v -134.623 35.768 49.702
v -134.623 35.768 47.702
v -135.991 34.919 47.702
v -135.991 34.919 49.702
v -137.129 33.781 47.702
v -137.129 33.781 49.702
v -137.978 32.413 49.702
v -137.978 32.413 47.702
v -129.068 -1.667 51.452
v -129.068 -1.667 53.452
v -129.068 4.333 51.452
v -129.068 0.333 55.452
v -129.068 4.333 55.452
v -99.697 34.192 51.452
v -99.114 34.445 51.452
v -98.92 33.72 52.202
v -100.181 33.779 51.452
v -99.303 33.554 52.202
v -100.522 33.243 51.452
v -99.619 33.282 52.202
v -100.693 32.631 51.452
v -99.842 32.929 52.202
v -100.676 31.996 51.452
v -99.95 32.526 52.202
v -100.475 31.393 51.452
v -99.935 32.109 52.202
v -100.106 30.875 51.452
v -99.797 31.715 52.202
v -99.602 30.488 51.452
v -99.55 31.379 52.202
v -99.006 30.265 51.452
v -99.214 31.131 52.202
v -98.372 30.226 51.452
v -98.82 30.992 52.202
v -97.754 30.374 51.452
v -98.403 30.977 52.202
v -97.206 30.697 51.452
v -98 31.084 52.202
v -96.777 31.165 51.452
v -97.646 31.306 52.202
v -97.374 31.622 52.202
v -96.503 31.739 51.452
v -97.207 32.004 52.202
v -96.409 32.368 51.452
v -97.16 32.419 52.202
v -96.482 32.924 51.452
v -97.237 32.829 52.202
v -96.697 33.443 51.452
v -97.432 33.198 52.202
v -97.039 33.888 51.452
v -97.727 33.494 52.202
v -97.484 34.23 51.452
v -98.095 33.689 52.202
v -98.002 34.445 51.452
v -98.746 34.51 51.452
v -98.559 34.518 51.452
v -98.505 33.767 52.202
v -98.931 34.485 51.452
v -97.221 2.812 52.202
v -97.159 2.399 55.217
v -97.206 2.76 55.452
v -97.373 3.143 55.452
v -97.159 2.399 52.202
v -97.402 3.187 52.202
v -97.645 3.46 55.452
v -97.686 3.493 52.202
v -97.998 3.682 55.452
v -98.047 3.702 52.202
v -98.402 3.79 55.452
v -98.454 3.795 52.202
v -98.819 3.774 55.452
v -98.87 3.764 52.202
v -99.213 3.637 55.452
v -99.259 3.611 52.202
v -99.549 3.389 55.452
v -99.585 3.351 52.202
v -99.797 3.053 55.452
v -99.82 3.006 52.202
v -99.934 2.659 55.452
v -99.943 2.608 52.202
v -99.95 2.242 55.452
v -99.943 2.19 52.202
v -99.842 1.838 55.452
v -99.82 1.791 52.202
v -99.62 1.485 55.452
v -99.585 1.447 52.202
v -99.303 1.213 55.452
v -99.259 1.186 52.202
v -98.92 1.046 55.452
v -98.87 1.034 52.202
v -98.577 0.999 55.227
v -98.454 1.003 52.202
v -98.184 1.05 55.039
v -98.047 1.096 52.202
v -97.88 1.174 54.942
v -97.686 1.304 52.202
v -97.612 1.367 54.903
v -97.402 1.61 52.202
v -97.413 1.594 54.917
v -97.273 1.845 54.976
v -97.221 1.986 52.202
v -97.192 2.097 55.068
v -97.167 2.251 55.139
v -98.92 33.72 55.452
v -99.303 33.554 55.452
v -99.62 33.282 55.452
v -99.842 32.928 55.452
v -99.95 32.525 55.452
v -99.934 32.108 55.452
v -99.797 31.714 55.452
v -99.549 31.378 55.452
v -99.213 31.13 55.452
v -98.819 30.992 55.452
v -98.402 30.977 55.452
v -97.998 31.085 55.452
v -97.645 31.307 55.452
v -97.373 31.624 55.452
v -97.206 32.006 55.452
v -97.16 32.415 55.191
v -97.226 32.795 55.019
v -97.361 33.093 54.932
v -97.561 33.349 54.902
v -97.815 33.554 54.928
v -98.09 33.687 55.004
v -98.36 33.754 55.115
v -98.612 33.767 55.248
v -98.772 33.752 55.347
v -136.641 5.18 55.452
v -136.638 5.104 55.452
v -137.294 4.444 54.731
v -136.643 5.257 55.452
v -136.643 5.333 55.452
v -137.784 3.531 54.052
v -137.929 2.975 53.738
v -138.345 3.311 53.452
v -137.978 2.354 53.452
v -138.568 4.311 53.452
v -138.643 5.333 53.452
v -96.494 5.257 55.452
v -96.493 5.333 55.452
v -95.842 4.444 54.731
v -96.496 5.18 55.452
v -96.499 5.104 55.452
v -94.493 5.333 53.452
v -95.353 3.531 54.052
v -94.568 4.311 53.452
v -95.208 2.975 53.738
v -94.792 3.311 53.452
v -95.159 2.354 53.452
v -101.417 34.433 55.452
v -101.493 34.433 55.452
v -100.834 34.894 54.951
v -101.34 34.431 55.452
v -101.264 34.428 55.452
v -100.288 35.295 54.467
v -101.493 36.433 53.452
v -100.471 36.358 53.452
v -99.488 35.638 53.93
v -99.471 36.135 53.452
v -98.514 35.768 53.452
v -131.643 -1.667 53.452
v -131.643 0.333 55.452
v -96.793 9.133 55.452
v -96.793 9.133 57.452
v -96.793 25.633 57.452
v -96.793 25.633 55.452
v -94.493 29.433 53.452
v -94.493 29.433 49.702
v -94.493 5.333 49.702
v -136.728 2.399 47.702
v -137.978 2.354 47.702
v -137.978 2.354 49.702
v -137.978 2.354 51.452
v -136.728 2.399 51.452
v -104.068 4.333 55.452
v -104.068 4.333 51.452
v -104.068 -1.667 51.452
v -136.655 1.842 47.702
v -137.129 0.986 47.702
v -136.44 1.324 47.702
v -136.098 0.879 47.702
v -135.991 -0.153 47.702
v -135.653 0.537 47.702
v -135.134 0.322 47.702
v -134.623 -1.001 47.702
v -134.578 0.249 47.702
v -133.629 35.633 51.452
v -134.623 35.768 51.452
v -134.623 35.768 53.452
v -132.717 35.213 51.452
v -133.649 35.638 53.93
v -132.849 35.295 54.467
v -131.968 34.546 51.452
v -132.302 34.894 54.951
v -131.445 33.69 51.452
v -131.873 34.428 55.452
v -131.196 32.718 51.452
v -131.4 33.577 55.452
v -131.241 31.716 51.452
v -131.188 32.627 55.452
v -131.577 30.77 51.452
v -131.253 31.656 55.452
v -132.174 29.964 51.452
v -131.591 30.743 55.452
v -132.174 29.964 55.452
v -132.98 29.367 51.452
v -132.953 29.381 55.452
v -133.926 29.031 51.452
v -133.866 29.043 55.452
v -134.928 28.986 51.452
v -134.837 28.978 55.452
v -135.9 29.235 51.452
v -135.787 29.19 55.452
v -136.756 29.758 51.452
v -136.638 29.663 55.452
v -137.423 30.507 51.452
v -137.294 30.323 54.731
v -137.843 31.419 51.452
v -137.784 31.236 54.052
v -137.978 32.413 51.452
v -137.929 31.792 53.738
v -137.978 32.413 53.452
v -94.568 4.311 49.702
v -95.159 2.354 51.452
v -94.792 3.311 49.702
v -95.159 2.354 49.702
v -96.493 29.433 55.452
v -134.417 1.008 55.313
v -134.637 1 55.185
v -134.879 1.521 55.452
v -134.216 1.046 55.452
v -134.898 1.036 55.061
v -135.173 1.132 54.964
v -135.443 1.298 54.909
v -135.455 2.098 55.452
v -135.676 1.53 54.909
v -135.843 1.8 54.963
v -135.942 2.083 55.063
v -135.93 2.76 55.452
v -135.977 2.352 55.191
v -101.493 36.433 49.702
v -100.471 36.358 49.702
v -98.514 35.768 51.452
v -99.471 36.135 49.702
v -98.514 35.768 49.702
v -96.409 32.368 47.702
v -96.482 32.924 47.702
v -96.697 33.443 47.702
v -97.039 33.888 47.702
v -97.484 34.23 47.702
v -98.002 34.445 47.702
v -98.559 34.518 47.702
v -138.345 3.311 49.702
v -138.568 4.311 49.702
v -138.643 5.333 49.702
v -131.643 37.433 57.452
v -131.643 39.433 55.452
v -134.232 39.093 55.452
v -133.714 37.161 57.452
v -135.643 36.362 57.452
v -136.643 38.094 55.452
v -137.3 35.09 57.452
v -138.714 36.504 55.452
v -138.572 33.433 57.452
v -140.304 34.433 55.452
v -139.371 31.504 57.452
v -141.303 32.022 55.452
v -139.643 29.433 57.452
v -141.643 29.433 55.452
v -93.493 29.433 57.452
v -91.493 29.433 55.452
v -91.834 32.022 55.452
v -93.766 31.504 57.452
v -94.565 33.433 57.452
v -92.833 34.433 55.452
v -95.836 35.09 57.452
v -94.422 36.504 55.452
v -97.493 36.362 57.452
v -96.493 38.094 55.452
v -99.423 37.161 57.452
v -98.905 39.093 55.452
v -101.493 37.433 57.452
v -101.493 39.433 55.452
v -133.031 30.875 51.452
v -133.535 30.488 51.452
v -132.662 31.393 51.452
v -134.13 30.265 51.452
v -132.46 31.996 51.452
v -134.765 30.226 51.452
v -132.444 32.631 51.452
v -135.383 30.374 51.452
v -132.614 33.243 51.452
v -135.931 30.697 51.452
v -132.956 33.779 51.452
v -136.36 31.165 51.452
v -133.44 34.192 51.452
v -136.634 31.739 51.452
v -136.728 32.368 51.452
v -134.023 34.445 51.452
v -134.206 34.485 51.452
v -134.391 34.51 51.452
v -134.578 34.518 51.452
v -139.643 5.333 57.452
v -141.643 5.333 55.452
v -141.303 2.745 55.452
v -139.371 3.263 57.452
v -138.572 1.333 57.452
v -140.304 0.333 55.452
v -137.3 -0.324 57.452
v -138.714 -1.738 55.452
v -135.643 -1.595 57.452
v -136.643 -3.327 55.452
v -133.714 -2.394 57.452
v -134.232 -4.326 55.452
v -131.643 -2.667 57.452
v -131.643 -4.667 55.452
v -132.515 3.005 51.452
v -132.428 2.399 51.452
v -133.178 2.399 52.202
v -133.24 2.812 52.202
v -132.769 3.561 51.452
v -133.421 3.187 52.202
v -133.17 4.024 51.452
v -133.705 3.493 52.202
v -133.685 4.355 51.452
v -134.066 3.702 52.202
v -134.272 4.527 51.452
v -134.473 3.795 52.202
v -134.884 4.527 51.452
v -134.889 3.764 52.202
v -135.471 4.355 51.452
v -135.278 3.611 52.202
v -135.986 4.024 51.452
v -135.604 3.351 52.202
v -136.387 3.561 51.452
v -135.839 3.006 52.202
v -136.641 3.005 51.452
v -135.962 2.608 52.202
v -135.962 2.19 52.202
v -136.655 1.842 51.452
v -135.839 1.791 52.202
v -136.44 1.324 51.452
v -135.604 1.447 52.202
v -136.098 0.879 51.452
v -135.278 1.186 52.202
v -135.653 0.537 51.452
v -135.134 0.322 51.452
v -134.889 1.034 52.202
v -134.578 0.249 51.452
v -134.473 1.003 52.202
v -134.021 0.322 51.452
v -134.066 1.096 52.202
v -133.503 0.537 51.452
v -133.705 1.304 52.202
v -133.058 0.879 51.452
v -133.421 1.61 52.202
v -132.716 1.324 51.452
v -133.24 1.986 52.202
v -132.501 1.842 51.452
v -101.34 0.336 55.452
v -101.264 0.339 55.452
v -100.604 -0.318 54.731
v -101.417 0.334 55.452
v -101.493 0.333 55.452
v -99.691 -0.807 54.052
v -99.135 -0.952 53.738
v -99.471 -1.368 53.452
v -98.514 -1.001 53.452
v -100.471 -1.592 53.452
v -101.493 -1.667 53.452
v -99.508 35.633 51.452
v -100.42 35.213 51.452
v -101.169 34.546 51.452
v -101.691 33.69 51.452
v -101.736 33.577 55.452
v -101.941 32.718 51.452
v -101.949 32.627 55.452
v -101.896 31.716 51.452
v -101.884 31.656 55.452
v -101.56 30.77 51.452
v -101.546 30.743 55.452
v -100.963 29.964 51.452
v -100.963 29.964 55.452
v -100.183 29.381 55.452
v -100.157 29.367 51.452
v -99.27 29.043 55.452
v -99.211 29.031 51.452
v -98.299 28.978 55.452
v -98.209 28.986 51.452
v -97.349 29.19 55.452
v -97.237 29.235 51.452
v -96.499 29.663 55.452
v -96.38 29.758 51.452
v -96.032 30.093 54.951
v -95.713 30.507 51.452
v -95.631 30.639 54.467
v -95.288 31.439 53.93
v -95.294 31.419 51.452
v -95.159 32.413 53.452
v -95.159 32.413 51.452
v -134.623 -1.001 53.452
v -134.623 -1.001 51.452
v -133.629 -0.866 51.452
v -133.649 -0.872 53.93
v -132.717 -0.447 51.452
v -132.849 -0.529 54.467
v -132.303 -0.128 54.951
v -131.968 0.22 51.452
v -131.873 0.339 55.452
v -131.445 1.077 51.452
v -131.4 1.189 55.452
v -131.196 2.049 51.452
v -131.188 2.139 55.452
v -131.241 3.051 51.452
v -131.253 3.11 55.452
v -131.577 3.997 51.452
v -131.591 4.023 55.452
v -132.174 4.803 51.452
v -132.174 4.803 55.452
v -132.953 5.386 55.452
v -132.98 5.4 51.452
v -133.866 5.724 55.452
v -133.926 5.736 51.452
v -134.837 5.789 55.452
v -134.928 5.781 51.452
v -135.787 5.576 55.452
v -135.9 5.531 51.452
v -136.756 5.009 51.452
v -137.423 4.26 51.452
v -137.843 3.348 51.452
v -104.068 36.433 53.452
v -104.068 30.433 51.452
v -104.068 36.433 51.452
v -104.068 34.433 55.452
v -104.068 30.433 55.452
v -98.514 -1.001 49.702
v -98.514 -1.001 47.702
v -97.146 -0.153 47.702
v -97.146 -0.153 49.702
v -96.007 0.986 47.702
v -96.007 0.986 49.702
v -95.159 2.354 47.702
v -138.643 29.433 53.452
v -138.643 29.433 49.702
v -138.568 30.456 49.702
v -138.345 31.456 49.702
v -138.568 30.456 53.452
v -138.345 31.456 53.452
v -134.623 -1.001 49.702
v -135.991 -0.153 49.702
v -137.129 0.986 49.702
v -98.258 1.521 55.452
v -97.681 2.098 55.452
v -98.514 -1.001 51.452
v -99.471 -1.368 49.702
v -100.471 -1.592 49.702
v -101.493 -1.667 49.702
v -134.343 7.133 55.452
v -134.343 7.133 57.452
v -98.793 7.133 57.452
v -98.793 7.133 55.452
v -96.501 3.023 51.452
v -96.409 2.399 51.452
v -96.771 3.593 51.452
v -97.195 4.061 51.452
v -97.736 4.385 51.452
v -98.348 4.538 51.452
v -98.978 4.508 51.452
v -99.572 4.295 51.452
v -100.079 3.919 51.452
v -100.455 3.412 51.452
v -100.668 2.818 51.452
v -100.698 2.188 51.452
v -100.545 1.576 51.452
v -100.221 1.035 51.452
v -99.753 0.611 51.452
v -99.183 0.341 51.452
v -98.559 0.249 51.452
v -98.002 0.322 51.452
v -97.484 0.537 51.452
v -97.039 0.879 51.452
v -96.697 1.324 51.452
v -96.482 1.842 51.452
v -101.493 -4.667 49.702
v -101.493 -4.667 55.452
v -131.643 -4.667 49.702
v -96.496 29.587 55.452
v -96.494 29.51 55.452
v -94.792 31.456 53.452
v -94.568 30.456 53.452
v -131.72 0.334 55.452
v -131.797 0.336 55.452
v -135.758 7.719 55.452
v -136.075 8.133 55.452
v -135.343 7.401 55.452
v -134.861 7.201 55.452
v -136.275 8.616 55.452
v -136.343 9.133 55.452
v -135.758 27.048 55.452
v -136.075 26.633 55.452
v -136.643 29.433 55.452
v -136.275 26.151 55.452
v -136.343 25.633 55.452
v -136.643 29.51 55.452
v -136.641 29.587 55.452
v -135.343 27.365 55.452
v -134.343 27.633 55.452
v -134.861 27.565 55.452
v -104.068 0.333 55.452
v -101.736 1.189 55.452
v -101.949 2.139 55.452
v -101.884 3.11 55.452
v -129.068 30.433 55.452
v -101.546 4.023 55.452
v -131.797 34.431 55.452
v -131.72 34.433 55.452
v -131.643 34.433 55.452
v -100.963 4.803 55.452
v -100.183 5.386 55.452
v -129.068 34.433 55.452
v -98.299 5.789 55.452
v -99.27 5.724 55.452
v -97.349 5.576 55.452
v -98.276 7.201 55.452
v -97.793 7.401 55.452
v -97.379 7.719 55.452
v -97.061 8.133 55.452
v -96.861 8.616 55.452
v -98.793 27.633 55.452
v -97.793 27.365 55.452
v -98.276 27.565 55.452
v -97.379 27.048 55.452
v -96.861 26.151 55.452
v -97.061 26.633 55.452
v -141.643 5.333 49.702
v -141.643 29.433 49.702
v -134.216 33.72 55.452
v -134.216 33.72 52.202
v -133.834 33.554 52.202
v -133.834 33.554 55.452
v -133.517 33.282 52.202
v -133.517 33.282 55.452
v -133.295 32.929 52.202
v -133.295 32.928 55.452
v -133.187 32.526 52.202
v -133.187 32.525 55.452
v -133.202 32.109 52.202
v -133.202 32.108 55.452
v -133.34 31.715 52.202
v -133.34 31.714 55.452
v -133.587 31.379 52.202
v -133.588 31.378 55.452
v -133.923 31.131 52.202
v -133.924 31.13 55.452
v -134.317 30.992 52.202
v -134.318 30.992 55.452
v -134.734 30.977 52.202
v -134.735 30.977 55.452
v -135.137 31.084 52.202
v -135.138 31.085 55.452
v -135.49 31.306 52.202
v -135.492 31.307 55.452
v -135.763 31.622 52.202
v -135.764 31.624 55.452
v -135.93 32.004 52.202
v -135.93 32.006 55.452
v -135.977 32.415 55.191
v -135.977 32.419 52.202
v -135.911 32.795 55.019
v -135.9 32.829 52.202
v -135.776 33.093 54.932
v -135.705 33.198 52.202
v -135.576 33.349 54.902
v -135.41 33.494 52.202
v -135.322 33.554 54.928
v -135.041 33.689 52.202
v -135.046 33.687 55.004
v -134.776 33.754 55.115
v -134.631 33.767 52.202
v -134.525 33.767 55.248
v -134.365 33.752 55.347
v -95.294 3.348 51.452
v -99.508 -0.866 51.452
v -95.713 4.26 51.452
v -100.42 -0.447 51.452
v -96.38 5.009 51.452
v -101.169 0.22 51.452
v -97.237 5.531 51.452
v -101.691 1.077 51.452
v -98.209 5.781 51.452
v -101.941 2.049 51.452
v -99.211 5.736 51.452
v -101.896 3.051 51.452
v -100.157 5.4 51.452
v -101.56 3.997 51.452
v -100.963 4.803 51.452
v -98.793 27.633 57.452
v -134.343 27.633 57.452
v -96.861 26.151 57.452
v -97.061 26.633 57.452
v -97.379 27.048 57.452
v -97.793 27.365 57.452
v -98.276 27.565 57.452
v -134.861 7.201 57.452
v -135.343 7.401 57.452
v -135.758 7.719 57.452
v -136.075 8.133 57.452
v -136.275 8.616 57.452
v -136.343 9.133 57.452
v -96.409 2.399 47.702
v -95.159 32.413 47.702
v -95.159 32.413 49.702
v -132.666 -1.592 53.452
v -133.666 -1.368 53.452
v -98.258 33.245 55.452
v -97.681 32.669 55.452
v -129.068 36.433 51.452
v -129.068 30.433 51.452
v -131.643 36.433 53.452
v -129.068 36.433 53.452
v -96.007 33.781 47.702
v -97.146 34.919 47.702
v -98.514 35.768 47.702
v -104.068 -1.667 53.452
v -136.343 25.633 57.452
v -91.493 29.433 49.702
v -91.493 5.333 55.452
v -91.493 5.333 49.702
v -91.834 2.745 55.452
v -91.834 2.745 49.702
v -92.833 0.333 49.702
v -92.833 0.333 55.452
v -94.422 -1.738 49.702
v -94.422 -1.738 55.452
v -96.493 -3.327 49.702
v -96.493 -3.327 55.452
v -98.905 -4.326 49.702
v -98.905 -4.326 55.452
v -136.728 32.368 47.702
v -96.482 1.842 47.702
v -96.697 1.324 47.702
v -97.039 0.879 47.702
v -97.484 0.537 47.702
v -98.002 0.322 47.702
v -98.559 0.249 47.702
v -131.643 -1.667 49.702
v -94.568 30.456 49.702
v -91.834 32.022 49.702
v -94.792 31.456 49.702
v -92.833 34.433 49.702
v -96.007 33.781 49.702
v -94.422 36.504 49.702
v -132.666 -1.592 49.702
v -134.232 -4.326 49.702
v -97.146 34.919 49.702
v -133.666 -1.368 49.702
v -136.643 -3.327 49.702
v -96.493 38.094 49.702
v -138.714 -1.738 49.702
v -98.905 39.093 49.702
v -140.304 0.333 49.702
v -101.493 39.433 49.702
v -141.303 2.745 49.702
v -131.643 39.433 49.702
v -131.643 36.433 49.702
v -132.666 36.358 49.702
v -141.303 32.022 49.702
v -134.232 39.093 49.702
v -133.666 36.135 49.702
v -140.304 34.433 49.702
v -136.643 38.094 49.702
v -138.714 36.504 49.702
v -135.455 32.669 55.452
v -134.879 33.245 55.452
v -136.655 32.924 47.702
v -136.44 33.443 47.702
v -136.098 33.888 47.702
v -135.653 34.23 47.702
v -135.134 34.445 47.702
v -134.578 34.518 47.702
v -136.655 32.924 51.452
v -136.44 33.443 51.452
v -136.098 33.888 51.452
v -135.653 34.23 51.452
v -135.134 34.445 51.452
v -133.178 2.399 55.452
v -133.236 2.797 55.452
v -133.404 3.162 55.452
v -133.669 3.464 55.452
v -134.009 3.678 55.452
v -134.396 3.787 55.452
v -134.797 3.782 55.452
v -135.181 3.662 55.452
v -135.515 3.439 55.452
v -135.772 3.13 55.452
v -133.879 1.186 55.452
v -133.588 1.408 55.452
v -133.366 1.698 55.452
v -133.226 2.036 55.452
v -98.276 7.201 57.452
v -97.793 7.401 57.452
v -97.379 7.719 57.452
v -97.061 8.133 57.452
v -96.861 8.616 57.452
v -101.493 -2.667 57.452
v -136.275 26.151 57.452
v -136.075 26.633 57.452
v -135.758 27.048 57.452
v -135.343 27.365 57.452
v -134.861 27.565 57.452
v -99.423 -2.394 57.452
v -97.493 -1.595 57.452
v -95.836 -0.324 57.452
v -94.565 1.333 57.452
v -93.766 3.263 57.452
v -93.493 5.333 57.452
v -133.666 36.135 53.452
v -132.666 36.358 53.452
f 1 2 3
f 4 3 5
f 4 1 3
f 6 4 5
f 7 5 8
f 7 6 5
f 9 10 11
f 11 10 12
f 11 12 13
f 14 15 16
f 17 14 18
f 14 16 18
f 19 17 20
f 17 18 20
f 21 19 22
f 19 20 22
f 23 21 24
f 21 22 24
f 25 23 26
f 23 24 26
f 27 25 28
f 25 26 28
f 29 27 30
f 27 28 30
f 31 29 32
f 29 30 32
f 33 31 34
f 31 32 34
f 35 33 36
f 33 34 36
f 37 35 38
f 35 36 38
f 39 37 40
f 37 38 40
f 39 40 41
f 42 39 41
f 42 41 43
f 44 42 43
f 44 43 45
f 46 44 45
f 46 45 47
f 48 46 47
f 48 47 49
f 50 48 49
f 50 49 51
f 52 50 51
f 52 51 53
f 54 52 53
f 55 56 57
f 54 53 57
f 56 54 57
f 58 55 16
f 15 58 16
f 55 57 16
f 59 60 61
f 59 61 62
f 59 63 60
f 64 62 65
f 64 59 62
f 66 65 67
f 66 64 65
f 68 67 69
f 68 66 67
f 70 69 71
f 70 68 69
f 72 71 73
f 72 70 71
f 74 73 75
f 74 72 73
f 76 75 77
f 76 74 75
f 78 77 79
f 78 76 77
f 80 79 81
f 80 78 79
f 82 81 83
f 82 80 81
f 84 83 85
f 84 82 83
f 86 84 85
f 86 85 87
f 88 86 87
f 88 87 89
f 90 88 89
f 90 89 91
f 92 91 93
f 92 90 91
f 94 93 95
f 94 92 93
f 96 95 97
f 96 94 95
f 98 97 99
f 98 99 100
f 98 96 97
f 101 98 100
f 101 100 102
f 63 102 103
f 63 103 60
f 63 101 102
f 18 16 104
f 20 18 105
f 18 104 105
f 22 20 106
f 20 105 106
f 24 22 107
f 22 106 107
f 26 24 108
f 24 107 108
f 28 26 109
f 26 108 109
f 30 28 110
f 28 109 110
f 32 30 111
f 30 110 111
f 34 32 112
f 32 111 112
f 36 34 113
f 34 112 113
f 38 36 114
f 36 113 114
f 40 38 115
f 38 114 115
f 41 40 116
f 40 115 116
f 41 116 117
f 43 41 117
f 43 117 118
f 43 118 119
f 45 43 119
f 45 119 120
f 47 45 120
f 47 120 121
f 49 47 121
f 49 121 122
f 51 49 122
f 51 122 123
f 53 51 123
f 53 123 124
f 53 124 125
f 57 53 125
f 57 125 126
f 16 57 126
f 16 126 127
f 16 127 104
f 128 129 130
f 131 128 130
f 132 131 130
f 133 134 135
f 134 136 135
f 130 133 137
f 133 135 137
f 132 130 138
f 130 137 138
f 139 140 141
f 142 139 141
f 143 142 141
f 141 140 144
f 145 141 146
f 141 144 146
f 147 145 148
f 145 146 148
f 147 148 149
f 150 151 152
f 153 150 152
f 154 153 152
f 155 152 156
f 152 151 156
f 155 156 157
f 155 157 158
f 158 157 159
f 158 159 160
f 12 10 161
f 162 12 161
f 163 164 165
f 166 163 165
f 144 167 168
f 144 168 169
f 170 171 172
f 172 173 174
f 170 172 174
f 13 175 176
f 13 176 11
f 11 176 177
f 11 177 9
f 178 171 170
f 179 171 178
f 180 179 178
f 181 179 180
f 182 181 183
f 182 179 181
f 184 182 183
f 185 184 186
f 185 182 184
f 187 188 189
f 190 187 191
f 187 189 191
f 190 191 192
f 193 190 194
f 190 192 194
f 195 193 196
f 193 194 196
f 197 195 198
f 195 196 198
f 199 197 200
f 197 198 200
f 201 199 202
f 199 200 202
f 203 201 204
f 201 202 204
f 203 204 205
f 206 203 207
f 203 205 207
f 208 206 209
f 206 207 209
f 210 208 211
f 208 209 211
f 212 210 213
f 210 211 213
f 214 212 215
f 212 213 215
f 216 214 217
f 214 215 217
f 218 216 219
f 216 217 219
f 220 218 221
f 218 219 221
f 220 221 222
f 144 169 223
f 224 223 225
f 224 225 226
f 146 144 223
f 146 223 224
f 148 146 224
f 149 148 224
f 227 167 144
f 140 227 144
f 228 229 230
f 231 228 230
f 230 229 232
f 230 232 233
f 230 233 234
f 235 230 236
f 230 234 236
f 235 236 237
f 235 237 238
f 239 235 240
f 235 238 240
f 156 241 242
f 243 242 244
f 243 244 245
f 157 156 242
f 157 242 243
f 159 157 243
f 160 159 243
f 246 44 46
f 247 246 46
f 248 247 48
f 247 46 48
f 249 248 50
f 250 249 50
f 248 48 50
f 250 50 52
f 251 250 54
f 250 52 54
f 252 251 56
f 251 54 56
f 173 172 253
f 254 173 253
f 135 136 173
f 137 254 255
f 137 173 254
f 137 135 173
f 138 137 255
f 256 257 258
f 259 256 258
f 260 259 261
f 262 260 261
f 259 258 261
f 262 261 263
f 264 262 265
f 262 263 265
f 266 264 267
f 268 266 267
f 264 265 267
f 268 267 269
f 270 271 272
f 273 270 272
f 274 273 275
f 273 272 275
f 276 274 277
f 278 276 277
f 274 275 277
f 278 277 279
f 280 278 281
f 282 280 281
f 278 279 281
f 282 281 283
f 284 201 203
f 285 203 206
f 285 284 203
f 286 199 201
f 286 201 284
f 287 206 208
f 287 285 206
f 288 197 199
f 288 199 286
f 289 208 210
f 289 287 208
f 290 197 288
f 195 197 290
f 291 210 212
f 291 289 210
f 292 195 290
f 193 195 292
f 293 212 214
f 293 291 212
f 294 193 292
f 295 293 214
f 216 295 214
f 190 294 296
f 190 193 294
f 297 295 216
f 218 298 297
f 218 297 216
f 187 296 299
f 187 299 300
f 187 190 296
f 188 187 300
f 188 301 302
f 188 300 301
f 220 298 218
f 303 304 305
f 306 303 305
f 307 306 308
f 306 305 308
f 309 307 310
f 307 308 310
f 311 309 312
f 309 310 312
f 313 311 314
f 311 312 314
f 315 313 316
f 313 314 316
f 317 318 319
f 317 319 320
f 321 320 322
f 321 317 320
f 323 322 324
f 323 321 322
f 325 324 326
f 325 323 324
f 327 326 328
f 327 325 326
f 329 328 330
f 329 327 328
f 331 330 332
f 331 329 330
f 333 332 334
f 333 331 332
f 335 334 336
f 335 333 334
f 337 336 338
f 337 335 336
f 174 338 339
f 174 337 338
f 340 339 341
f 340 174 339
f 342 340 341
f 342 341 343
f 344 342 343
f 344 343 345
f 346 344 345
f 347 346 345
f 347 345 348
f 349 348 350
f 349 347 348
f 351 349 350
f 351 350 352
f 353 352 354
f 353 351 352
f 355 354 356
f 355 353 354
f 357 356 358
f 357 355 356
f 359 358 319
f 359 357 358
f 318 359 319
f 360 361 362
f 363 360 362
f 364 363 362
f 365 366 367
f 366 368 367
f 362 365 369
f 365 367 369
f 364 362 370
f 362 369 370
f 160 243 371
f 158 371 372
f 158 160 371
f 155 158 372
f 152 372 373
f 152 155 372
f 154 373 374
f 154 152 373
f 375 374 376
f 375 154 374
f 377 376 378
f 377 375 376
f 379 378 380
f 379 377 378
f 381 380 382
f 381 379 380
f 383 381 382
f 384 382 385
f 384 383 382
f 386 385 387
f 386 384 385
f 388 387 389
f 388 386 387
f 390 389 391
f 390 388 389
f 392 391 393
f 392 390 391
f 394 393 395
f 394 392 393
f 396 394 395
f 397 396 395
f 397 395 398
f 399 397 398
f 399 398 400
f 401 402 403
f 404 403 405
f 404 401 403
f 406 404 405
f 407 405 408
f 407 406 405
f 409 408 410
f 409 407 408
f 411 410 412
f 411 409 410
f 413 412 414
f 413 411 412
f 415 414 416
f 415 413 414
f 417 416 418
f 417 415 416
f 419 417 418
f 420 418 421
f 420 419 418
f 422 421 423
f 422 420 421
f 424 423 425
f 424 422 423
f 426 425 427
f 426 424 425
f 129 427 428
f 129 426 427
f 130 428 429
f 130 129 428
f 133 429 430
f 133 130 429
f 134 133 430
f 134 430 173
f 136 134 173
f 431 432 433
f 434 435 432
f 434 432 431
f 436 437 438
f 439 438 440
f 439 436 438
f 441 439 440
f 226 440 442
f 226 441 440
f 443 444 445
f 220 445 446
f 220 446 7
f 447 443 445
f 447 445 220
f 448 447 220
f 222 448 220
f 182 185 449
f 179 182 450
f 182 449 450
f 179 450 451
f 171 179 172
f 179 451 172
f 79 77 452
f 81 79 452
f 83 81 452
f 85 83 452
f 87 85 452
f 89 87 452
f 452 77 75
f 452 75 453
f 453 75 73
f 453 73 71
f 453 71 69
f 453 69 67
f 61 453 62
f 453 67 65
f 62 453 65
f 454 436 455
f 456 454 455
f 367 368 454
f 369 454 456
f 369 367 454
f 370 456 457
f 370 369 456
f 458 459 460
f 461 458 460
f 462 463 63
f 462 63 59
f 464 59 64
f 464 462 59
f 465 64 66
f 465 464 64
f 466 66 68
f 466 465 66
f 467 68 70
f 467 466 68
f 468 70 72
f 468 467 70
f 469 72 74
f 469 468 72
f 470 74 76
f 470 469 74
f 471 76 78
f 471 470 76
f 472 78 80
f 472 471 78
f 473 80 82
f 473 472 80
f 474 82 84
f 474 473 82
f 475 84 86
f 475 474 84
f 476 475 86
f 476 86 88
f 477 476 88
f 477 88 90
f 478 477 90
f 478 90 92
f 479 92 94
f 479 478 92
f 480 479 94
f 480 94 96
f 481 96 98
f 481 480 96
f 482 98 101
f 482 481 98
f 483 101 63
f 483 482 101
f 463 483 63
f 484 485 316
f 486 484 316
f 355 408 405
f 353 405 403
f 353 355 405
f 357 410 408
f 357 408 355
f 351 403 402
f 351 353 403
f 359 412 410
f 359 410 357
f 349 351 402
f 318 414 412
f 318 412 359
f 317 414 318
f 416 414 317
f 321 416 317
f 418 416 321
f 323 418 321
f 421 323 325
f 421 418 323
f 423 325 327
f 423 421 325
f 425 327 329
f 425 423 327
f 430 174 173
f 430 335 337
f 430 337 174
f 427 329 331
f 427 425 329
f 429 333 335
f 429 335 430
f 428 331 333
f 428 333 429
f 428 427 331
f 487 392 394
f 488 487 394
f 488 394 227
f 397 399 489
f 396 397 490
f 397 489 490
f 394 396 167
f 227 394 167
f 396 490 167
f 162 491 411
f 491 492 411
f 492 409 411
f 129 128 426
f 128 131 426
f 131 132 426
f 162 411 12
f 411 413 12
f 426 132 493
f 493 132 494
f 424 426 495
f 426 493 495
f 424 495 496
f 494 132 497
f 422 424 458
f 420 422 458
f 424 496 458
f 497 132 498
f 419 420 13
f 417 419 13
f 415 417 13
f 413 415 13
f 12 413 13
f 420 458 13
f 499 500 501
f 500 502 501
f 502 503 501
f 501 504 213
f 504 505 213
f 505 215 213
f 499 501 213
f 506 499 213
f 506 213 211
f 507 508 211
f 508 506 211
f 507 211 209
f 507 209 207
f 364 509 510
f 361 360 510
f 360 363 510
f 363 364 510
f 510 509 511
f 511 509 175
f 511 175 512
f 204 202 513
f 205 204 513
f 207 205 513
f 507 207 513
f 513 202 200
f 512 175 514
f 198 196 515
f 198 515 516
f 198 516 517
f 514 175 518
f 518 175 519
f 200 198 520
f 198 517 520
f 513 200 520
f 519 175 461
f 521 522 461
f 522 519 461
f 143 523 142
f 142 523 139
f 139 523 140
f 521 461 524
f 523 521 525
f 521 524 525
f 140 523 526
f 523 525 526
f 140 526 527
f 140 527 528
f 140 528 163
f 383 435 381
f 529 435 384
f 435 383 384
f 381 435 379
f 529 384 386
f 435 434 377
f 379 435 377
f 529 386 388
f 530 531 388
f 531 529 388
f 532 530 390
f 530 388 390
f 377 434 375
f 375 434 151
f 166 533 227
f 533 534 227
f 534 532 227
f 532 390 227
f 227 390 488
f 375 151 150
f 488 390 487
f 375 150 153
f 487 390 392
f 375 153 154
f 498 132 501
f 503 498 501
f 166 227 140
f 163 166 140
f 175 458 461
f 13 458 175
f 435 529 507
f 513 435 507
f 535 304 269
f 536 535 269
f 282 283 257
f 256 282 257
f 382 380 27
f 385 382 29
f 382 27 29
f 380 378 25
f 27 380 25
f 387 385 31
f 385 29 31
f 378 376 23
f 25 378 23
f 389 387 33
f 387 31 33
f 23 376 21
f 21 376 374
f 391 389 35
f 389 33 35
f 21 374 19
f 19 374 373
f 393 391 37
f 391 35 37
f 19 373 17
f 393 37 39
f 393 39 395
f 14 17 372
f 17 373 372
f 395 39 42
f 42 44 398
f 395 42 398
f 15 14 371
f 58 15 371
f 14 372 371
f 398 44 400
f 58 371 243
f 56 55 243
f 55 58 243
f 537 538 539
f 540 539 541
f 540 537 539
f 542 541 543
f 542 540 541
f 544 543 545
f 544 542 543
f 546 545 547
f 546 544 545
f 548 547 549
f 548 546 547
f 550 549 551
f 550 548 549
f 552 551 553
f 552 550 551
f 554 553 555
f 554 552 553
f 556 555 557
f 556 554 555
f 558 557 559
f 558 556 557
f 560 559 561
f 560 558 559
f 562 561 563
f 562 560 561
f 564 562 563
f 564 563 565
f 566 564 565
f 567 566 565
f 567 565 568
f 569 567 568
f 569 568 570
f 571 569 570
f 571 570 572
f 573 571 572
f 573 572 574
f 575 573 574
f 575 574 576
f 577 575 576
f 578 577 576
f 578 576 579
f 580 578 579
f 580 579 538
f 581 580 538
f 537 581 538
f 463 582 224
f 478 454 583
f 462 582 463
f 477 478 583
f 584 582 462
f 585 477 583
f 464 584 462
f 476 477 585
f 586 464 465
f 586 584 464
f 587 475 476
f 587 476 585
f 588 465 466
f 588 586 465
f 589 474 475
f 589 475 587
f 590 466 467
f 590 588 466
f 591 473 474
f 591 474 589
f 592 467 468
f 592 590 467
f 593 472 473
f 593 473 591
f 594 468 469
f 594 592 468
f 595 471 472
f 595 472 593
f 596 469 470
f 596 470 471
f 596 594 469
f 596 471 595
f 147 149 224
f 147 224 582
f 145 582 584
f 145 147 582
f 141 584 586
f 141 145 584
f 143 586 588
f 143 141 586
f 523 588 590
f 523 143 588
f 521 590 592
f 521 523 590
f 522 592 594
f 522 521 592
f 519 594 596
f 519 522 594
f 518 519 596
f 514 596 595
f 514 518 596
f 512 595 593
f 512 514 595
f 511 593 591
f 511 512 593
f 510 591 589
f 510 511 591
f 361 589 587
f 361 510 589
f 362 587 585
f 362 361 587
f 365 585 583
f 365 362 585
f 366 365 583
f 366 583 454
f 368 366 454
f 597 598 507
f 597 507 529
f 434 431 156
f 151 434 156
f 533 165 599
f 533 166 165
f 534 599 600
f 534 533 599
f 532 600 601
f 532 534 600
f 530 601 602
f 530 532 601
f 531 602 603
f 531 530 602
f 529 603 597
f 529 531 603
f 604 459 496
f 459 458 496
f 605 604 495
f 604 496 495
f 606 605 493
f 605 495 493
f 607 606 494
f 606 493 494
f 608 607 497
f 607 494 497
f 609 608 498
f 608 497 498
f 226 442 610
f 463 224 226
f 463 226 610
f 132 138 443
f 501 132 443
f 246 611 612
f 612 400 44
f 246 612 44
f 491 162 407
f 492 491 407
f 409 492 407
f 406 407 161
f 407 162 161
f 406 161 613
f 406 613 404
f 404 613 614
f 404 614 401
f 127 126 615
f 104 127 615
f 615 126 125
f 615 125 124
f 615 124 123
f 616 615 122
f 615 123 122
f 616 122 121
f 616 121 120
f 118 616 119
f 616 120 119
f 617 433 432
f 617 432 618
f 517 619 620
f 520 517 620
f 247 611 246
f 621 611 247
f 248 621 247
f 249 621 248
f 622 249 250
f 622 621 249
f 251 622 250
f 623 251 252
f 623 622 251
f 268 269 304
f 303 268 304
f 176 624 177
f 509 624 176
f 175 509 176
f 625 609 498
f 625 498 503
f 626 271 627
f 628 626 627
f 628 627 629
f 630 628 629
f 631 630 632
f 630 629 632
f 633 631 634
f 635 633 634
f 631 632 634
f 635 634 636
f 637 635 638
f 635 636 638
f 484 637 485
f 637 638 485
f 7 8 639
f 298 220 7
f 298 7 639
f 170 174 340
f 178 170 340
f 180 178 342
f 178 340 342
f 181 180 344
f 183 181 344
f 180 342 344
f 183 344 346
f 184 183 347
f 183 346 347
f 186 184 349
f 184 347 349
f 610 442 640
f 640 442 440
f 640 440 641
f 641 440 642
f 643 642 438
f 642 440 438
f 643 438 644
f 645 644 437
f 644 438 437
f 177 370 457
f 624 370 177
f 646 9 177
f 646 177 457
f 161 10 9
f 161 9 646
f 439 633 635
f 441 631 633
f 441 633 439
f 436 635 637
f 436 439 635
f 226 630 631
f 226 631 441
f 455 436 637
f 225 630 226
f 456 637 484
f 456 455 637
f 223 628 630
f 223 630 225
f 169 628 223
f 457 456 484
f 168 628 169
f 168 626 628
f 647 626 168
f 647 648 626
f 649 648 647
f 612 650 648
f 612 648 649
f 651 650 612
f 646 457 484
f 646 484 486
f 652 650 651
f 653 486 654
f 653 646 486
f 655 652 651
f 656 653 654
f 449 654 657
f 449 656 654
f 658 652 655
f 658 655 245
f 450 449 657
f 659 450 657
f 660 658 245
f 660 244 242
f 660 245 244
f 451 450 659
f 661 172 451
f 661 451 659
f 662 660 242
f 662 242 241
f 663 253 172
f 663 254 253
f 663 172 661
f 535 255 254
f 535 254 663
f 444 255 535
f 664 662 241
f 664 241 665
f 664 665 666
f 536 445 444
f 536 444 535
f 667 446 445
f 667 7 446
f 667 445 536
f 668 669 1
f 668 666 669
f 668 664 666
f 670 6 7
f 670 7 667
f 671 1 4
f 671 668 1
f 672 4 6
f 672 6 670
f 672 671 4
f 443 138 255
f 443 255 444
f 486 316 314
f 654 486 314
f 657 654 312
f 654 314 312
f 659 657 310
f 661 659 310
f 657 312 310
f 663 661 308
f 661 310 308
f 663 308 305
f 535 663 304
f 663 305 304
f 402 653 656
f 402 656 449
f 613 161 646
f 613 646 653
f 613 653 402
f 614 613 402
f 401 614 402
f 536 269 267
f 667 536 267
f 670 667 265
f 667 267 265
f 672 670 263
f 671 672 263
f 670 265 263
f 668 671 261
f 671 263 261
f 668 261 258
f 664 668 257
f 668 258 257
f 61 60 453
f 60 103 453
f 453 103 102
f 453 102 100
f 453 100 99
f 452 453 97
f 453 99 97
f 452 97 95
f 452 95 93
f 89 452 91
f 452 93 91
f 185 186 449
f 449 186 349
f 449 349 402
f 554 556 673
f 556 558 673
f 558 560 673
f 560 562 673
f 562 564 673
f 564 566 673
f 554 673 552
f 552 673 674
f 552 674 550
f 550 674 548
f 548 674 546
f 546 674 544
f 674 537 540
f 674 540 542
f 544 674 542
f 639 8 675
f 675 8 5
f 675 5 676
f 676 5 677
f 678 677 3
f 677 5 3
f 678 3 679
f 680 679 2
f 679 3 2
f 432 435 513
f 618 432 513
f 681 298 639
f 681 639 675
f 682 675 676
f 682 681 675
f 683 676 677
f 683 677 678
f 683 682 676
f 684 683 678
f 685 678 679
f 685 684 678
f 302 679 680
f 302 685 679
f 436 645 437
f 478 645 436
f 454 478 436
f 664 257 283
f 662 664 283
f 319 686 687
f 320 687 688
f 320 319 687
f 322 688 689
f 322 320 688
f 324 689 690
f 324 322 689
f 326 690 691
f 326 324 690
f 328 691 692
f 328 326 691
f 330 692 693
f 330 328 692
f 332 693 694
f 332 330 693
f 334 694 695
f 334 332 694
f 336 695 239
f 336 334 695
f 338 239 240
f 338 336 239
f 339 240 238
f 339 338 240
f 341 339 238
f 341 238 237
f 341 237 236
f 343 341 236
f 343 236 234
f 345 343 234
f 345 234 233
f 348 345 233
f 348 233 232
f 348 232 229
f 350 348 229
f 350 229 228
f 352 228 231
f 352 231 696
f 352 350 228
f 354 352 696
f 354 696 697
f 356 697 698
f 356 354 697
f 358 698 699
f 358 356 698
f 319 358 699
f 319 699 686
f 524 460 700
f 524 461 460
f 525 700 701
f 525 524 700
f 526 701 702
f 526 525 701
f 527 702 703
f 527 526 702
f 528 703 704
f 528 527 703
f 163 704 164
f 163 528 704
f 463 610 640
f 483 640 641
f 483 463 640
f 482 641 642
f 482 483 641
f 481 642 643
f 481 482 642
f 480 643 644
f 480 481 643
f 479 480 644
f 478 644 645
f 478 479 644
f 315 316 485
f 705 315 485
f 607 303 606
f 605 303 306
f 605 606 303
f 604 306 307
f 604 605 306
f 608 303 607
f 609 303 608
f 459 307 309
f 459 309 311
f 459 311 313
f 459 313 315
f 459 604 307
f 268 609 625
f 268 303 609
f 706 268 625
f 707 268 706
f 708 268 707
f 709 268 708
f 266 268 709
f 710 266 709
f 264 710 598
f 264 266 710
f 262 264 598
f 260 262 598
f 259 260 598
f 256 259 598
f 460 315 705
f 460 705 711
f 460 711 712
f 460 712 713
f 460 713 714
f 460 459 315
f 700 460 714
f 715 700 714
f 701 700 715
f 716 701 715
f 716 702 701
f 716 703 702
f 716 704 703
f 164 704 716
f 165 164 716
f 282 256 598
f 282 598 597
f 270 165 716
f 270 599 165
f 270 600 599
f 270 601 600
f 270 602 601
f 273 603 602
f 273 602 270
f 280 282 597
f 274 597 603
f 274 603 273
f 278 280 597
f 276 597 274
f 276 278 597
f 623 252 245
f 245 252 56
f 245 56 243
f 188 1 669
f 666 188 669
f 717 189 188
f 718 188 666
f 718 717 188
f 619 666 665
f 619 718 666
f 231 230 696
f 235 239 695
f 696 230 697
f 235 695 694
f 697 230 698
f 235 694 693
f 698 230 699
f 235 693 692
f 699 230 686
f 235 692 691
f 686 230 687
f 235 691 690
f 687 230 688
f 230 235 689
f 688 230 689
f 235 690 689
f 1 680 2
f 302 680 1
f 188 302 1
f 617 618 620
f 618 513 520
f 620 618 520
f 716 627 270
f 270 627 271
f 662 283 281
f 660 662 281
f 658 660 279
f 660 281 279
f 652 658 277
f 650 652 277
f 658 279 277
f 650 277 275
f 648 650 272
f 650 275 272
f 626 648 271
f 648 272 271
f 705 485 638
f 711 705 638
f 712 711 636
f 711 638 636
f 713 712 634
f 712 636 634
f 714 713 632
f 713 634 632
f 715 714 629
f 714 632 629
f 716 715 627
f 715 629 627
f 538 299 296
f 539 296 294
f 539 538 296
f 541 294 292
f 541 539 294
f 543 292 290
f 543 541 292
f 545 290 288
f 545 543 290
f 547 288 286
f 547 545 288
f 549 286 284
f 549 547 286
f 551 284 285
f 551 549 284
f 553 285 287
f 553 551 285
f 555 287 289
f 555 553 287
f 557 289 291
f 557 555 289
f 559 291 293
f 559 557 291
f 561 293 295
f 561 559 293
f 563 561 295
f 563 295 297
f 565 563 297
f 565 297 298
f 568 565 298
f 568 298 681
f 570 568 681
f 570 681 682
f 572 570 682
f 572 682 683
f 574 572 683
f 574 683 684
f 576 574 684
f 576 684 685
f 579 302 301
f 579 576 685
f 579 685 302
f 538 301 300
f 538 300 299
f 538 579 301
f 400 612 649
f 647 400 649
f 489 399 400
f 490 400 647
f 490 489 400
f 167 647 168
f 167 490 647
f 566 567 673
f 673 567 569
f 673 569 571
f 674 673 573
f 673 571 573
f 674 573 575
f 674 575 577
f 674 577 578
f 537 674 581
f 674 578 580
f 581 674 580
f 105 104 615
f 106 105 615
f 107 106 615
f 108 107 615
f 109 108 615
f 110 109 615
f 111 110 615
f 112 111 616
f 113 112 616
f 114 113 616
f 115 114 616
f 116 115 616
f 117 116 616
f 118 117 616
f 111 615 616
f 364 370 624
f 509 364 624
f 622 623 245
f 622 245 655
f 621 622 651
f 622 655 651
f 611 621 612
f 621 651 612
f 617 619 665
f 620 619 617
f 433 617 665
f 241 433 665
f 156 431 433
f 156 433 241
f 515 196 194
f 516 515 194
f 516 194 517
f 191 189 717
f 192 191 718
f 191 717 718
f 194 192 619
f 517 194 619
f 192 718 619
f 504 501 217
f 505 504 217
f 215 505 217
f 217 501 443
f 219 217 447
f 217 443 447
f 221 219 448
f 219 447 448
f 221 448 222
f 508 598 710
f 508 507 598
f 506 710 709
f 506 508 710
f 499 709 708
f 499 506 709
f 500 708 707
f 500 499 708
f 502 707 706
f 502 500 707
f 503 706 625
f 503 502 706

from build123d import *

# Parameters (mm, degrees)
SKETCH1_W                = 39.55
SKETCH1_H                = 20.5
BOSS_EXTRUDE1_DEPTH      = 2
BOSS_EXTRUDE2_DEPTH      = 5.75
SKETCH3_W                = 25
SKETCH3_H                = 6
BOSS_EXTRUDE3_DEPTH      = 4
FILLET1_R                = 2
CHAMFER1_SIZE            = 2
CHAMFER2_SIZE            = 2
SKETCH4_R                = 3.4
SKETCH4_R_2              = 1.4
BOSS_EXTRUDE4_DEPTH      = 4
CHAMFER3_SIZE            = 0.75
CHAMFER3_OF_MIRROR1_SIZE = 0.75
BOSS_EXTRUDE6_DEPTH      = 3.75
MIRROR4_COPY_1_DEPTH     = 3.75


# Read off the part's stored shape, not the designer's step: Mirror2
with BuildPart() as part:
    # Sketch1 → Boss-Extrude1 (new body)
    with BuildSketch(Plane.XY.offset(57.451538964)):
        with BuildLine():
            Line((-141.643342382, 29.433342856), (-141.643342382, 5.333342856))
            ThreePointArc((-141.643342382, 5.333342856), (-138.714410194, -1.737724956), (-131.643342382, -4.666657144))
            Line((-131.643342382, -4.666657144), (-101.493342382, -4.666657144))
            ThreePointArc((-101.493342382, -4.666657144), (-94.42227457, -1.737724956), (-91.493342382, 5.333342856))
            Line((-91.493342382, 5.333342856), (-91.493342382, 29.433342856))
            ThreePointArc((-91.493342382, 29.433342856), (-94.42227457, 36.504410668), (-101.493342382, 39.433342856))
            Line((-101.493342382, 39.433342856), (-131.643342382, 39.433342856))
            ThreePointArc((-131.643342382, 39.433342856), (-138.714410194, 36.504410668), (-141.643342382, 29.433342856))
        make_face()
        with Locations((-116.568342382, 17.383342856)):
            Rectangle(SKETCH1_W, SKETCH1_H, mode=Mode.SUBTRACT)
    extrude(amount=-BOSS_EXTRUDE1_DEPTH)

    # Sketch2 → Boss-Extrude2 (add)
    with BuildSketch(Plane(origin=(0, 0, 55.451538964), x_dir=(-1, 0, 0), z_dir=(0, 0, -1))):
        with BuildLine():
            Line((141.643342382, 5.333342856), (141.643342382, 29.433342856))
            ThreePointArc((141.643342382, 29.433342856), (138.714410194, 36.504410668), (131.643342382, 39.433342856))
            Line((131.643342382, 39.433342856), (101.493342382, 39.433342856))
            ThreePointArc((101.493342382, 39.433342856), (94.42227457, 36.504410668), (91.493342382, 29.433342856))
            Line((91.493342382, 29.433342856), (91.493342382, 5.333342856))
            ThreePointArc((91.493342382, 5.333342856), (94.42227457, -1.737724956), (101.493342382, -4.666657144))
            Line((101.493342382, -4.666657144), (131.643342382, -4.666657144))
            ThreePointArc((131.643342382, -4.666657144), (138.714410194, -1.737724956), (141.643342382, 5.333342856))
        make_face()
        with BuildLine():
            Line((138.643342382, 5.333342856), (138.643342382, 29.433342856))
            ThreePointArc((138.643342382, 29.433342856), (136.59308985, 34.383090325), (131.643342382, 36.433342856))
            Line((131.643342382, 36.433342856), (101.493342382, 36.433342856))
            ThreePointArc((101.493342382, 36.433342856), (96.543594913, 34.383090325), (94.493342382, 29.433342856))
            Line((94.493342382, 29.433342856), (94.493342382, 5.333342856))
            ThreePointArc((94.493342382, 5.333342856), (96.543594913, 0.383595388), (101.493342382, -1.666657144))
            Line((101.493342382, -1.666657144), (131.643342382, -1.666657144))
            ThreePointArc((131.643342382, -1.666657144), (136.59308985, 0.383595388), (138.643342382, 5.333342856))
        make_face(mode=Mode.SUBTRACT)
    extrude(amount=BOSS_EXTRUDE2_DEPTH)

    # Sketch3 → Boss-Extrude3 (add)
    with BuildSketch(Plane(origin=(0, 0, 55.451538964), x_dir=(-1, 0, 0), z_dir=(0, 0, -1))):
        with Locations((116.568342382, 33.433342856)):
            Rectangle(SKETCH3_W, SKETCH3_H)
        with Locations((116.568342382, 1.333342856)):
            Rectangle(SKETCH3_W, SKETCH3_H)
    extrude(amount=BOSS_EXTRUDE3_DEPTH)

    # Fillet1
    fillet1_edges = [part.edges().sort_by_distance(p)[0] for p in [
        (-136.343342382, 27.633342856, 56.451538964),
        (-136.343342382, 7.133342856, 56.451538964),
        (-96.793342382, 7.133342856, 56.451538964),
        (-96.793342382, 27.633342856, 56.451538964),
    ]]
    fillet(fillet1_edges, radius=FILLET1_R)

    # Chamfer1
    chamfer1_edges = [part.edges().sort_by_distance(p)[0] for p in [
        (-138.714410194, 36.504410668, 57.451538964),
        (-116.568342382, 39.433342856, 57.451538964),
        (-94.42227457, 36.504410668, 57.451538964),
        (-91.493342382, 17.383342856, 57.451538964),
        (-94.42227457, -1.737724956, 57.451538964),
        (-116.568342382, -4.666657144, 57.451538964),
        (-138.714410194, -1.737724956, 57.451538964),
        (-141.643342382, 17.383342856, 57.451538964),
    ]]
    chamfer(chamfer1_edges, length=CHAMFER1_SIZE)

    # Chamfer2
    chamfer2_edges = [part.edges().sort_by_distance(p)[0] for p in [
        (-136.59308985, 0.383595388, 55.451538964),
        (-138.643342382, 17.383342856, 55.451538964),
        (-136.59308985, 34.383090325, 55.451538964),
        (-130.355842382, 36.433342856, 55.451538964),
        (-96.543594913, 34.383090325, 55.451538964),
        (-94.493342382, 17.383342856, 55.451538964),
        (-96.543594913, 0.383595388, 55.451538964),
        (-102.780842382, -1.666657144, 55.451538964),
        (-102.780842382, 36.433342856, 55.451538964),
        (-130.355842382, -1.666657144, 55.451538964),
    ]]
    chamfer(chamfer2_edges, length=CHAMFER2_SIZE)

    # Sketch4 → Boss-Extrude4 (add)
    with BuildSketch(Plane(origin=(0, 0, 55.451538964), x_dir=(-1, 0, 0), z_dir=(0, 0, -1))):
        with Locations((134.577835524, 32.367835998)):
            Circle(SKETCH4_R)
        with Locations(Location((134.577835524, 32.367835998, 0), (0, 0, 104.95728905))):
            Circle(SKETCH4_R_2, mode=Mode.SUBTRACT)
    boss_extrude4 = extrude(amount=BOSS_EXTRUDE4_DEPTH)

    # Chamfer3
    chamfer3_edges = [part.edges().sort_by_distance(p)[0] for p in [
        (-134.939174021, 31.015270107, 51.451538964),
    ]]
    chamfer(chamfer3_edges, length=CHAMFER3_SIZE)

    # Mirror1: Boss-Extrude4 across plane
    add(boss_extrude4.mirror(Plane(origin=(-116.568342382, 0, 0), x_dir=(0, 0, 1), z_dir=(1, 0, 0))))

    # Chamfer3 of Mirror1
    chamfer3_of_mirror1_edges = [part.edges().sort_by_distance(p)[0] for p in [
        (-98.197510742, 31.015270107, 51.451538964),
    ]]
    chamfer(chamfer3_of_mirror1_edges, length=CHAMFER3_OF_MIRROR1_SIZE)

    # Mirror2 outline → Mirror2 (revolve)
    with BuildSketch(Plane(origin=(-98.55884924, 2.398849714, 0), x_dir=(1, 0, 0), z_dir=(0, -1, 0))):
        Polygon((1.4, 52.201538964), (2.15, 51.451538964), (3.4, 51.451538964), (3.4, 55.451538967), (1.4, 55.451538967), align=None)
    revolve(axis=Axis((-98.55884924, 2.398849714, 0), (0, 0, 1)))

    # Mirror2 2 outline → Mirror2 2 (revolve)
    with BuildSketch(Plane(origin=(-134.577835524, 2.398849714, 0), x_dir=(1, 0, 0), z_dir=(0, -1, 0))):
        Polygon((1.4, 52.201538964), (2.15, 51.451538964), (3.4, 51.451538964), (3.4, 55.451538967), (1.4, 55.451538967), align=None)
    revolve(axis=Axis((-134.577835524, 2.398849714, 0), (0, 0, 1)))

    # Sketch5 → Boss-Extrude6 (add)
    with BuildSketch(Plane(origin=(0, 0, 51.451538964), x_dir=(-1, 0, 0), z_dir=(0, 0, -1))):
        with BuildLine():
            Line((98.55884924, 34.517835998), (98.513747348, 35.767536841))
            ThreePointArc((98.513747348, 35.767536841), (96.543594913, 34.383090325), (95.159148397, 32.41293789))
            Line((95.159148397, 32.41293789), (96.40884924, 32.367835998))
            ThreePointArc((96.40884924, 32.367835998), (97.03856966, 33.888115578), (98.55884924, 34.517835998))
        make_face()
    boss_extrude6 = extrude(amount=BOSS_EXTRUDE6_DEPTH)

    # Mirror3: Boss-Extrude6 across plane
    add(boss_extrude6.mirror(Plane(origin=(-116.568342382, 0, 0), x_dir=(0, 0, 1), z_dir=(1, 0, 0))))

    # Mirror4: Boss-Extrude6 across plane
    add(boss_extrude6.mirror(Plane.ZX.offset(17.383342856)))

    # Mirror4 copy 1 sketch → Mirror4 copy 1 (add)
    with BuildSketch(Plane(origin=(-233.136684763, 34.766685713, 51.451538964), x_dir=(1, 0, 0), z_dir=(0, 0, -1))):
        with BuildLine():
            Line((98.55884924, 34.517835998), (98.513747348, 35.767536841))
            ThreePointArc((98.513747348, 35.767536841), (96.543594913, 34.383090325), (95.159148397, 32.41293789))
            Line((95.159148397, 32.41293789), (96.40884924, 32.367835998))
            ThreePointArc((96.40884924, 32.367835998), (97.03856966, 33.888115578), (98.55884924, 34.517835998))
        make_face()
    extrude(amount=MIRROR4_COPY_1_DEPTH)


solid = part.part
